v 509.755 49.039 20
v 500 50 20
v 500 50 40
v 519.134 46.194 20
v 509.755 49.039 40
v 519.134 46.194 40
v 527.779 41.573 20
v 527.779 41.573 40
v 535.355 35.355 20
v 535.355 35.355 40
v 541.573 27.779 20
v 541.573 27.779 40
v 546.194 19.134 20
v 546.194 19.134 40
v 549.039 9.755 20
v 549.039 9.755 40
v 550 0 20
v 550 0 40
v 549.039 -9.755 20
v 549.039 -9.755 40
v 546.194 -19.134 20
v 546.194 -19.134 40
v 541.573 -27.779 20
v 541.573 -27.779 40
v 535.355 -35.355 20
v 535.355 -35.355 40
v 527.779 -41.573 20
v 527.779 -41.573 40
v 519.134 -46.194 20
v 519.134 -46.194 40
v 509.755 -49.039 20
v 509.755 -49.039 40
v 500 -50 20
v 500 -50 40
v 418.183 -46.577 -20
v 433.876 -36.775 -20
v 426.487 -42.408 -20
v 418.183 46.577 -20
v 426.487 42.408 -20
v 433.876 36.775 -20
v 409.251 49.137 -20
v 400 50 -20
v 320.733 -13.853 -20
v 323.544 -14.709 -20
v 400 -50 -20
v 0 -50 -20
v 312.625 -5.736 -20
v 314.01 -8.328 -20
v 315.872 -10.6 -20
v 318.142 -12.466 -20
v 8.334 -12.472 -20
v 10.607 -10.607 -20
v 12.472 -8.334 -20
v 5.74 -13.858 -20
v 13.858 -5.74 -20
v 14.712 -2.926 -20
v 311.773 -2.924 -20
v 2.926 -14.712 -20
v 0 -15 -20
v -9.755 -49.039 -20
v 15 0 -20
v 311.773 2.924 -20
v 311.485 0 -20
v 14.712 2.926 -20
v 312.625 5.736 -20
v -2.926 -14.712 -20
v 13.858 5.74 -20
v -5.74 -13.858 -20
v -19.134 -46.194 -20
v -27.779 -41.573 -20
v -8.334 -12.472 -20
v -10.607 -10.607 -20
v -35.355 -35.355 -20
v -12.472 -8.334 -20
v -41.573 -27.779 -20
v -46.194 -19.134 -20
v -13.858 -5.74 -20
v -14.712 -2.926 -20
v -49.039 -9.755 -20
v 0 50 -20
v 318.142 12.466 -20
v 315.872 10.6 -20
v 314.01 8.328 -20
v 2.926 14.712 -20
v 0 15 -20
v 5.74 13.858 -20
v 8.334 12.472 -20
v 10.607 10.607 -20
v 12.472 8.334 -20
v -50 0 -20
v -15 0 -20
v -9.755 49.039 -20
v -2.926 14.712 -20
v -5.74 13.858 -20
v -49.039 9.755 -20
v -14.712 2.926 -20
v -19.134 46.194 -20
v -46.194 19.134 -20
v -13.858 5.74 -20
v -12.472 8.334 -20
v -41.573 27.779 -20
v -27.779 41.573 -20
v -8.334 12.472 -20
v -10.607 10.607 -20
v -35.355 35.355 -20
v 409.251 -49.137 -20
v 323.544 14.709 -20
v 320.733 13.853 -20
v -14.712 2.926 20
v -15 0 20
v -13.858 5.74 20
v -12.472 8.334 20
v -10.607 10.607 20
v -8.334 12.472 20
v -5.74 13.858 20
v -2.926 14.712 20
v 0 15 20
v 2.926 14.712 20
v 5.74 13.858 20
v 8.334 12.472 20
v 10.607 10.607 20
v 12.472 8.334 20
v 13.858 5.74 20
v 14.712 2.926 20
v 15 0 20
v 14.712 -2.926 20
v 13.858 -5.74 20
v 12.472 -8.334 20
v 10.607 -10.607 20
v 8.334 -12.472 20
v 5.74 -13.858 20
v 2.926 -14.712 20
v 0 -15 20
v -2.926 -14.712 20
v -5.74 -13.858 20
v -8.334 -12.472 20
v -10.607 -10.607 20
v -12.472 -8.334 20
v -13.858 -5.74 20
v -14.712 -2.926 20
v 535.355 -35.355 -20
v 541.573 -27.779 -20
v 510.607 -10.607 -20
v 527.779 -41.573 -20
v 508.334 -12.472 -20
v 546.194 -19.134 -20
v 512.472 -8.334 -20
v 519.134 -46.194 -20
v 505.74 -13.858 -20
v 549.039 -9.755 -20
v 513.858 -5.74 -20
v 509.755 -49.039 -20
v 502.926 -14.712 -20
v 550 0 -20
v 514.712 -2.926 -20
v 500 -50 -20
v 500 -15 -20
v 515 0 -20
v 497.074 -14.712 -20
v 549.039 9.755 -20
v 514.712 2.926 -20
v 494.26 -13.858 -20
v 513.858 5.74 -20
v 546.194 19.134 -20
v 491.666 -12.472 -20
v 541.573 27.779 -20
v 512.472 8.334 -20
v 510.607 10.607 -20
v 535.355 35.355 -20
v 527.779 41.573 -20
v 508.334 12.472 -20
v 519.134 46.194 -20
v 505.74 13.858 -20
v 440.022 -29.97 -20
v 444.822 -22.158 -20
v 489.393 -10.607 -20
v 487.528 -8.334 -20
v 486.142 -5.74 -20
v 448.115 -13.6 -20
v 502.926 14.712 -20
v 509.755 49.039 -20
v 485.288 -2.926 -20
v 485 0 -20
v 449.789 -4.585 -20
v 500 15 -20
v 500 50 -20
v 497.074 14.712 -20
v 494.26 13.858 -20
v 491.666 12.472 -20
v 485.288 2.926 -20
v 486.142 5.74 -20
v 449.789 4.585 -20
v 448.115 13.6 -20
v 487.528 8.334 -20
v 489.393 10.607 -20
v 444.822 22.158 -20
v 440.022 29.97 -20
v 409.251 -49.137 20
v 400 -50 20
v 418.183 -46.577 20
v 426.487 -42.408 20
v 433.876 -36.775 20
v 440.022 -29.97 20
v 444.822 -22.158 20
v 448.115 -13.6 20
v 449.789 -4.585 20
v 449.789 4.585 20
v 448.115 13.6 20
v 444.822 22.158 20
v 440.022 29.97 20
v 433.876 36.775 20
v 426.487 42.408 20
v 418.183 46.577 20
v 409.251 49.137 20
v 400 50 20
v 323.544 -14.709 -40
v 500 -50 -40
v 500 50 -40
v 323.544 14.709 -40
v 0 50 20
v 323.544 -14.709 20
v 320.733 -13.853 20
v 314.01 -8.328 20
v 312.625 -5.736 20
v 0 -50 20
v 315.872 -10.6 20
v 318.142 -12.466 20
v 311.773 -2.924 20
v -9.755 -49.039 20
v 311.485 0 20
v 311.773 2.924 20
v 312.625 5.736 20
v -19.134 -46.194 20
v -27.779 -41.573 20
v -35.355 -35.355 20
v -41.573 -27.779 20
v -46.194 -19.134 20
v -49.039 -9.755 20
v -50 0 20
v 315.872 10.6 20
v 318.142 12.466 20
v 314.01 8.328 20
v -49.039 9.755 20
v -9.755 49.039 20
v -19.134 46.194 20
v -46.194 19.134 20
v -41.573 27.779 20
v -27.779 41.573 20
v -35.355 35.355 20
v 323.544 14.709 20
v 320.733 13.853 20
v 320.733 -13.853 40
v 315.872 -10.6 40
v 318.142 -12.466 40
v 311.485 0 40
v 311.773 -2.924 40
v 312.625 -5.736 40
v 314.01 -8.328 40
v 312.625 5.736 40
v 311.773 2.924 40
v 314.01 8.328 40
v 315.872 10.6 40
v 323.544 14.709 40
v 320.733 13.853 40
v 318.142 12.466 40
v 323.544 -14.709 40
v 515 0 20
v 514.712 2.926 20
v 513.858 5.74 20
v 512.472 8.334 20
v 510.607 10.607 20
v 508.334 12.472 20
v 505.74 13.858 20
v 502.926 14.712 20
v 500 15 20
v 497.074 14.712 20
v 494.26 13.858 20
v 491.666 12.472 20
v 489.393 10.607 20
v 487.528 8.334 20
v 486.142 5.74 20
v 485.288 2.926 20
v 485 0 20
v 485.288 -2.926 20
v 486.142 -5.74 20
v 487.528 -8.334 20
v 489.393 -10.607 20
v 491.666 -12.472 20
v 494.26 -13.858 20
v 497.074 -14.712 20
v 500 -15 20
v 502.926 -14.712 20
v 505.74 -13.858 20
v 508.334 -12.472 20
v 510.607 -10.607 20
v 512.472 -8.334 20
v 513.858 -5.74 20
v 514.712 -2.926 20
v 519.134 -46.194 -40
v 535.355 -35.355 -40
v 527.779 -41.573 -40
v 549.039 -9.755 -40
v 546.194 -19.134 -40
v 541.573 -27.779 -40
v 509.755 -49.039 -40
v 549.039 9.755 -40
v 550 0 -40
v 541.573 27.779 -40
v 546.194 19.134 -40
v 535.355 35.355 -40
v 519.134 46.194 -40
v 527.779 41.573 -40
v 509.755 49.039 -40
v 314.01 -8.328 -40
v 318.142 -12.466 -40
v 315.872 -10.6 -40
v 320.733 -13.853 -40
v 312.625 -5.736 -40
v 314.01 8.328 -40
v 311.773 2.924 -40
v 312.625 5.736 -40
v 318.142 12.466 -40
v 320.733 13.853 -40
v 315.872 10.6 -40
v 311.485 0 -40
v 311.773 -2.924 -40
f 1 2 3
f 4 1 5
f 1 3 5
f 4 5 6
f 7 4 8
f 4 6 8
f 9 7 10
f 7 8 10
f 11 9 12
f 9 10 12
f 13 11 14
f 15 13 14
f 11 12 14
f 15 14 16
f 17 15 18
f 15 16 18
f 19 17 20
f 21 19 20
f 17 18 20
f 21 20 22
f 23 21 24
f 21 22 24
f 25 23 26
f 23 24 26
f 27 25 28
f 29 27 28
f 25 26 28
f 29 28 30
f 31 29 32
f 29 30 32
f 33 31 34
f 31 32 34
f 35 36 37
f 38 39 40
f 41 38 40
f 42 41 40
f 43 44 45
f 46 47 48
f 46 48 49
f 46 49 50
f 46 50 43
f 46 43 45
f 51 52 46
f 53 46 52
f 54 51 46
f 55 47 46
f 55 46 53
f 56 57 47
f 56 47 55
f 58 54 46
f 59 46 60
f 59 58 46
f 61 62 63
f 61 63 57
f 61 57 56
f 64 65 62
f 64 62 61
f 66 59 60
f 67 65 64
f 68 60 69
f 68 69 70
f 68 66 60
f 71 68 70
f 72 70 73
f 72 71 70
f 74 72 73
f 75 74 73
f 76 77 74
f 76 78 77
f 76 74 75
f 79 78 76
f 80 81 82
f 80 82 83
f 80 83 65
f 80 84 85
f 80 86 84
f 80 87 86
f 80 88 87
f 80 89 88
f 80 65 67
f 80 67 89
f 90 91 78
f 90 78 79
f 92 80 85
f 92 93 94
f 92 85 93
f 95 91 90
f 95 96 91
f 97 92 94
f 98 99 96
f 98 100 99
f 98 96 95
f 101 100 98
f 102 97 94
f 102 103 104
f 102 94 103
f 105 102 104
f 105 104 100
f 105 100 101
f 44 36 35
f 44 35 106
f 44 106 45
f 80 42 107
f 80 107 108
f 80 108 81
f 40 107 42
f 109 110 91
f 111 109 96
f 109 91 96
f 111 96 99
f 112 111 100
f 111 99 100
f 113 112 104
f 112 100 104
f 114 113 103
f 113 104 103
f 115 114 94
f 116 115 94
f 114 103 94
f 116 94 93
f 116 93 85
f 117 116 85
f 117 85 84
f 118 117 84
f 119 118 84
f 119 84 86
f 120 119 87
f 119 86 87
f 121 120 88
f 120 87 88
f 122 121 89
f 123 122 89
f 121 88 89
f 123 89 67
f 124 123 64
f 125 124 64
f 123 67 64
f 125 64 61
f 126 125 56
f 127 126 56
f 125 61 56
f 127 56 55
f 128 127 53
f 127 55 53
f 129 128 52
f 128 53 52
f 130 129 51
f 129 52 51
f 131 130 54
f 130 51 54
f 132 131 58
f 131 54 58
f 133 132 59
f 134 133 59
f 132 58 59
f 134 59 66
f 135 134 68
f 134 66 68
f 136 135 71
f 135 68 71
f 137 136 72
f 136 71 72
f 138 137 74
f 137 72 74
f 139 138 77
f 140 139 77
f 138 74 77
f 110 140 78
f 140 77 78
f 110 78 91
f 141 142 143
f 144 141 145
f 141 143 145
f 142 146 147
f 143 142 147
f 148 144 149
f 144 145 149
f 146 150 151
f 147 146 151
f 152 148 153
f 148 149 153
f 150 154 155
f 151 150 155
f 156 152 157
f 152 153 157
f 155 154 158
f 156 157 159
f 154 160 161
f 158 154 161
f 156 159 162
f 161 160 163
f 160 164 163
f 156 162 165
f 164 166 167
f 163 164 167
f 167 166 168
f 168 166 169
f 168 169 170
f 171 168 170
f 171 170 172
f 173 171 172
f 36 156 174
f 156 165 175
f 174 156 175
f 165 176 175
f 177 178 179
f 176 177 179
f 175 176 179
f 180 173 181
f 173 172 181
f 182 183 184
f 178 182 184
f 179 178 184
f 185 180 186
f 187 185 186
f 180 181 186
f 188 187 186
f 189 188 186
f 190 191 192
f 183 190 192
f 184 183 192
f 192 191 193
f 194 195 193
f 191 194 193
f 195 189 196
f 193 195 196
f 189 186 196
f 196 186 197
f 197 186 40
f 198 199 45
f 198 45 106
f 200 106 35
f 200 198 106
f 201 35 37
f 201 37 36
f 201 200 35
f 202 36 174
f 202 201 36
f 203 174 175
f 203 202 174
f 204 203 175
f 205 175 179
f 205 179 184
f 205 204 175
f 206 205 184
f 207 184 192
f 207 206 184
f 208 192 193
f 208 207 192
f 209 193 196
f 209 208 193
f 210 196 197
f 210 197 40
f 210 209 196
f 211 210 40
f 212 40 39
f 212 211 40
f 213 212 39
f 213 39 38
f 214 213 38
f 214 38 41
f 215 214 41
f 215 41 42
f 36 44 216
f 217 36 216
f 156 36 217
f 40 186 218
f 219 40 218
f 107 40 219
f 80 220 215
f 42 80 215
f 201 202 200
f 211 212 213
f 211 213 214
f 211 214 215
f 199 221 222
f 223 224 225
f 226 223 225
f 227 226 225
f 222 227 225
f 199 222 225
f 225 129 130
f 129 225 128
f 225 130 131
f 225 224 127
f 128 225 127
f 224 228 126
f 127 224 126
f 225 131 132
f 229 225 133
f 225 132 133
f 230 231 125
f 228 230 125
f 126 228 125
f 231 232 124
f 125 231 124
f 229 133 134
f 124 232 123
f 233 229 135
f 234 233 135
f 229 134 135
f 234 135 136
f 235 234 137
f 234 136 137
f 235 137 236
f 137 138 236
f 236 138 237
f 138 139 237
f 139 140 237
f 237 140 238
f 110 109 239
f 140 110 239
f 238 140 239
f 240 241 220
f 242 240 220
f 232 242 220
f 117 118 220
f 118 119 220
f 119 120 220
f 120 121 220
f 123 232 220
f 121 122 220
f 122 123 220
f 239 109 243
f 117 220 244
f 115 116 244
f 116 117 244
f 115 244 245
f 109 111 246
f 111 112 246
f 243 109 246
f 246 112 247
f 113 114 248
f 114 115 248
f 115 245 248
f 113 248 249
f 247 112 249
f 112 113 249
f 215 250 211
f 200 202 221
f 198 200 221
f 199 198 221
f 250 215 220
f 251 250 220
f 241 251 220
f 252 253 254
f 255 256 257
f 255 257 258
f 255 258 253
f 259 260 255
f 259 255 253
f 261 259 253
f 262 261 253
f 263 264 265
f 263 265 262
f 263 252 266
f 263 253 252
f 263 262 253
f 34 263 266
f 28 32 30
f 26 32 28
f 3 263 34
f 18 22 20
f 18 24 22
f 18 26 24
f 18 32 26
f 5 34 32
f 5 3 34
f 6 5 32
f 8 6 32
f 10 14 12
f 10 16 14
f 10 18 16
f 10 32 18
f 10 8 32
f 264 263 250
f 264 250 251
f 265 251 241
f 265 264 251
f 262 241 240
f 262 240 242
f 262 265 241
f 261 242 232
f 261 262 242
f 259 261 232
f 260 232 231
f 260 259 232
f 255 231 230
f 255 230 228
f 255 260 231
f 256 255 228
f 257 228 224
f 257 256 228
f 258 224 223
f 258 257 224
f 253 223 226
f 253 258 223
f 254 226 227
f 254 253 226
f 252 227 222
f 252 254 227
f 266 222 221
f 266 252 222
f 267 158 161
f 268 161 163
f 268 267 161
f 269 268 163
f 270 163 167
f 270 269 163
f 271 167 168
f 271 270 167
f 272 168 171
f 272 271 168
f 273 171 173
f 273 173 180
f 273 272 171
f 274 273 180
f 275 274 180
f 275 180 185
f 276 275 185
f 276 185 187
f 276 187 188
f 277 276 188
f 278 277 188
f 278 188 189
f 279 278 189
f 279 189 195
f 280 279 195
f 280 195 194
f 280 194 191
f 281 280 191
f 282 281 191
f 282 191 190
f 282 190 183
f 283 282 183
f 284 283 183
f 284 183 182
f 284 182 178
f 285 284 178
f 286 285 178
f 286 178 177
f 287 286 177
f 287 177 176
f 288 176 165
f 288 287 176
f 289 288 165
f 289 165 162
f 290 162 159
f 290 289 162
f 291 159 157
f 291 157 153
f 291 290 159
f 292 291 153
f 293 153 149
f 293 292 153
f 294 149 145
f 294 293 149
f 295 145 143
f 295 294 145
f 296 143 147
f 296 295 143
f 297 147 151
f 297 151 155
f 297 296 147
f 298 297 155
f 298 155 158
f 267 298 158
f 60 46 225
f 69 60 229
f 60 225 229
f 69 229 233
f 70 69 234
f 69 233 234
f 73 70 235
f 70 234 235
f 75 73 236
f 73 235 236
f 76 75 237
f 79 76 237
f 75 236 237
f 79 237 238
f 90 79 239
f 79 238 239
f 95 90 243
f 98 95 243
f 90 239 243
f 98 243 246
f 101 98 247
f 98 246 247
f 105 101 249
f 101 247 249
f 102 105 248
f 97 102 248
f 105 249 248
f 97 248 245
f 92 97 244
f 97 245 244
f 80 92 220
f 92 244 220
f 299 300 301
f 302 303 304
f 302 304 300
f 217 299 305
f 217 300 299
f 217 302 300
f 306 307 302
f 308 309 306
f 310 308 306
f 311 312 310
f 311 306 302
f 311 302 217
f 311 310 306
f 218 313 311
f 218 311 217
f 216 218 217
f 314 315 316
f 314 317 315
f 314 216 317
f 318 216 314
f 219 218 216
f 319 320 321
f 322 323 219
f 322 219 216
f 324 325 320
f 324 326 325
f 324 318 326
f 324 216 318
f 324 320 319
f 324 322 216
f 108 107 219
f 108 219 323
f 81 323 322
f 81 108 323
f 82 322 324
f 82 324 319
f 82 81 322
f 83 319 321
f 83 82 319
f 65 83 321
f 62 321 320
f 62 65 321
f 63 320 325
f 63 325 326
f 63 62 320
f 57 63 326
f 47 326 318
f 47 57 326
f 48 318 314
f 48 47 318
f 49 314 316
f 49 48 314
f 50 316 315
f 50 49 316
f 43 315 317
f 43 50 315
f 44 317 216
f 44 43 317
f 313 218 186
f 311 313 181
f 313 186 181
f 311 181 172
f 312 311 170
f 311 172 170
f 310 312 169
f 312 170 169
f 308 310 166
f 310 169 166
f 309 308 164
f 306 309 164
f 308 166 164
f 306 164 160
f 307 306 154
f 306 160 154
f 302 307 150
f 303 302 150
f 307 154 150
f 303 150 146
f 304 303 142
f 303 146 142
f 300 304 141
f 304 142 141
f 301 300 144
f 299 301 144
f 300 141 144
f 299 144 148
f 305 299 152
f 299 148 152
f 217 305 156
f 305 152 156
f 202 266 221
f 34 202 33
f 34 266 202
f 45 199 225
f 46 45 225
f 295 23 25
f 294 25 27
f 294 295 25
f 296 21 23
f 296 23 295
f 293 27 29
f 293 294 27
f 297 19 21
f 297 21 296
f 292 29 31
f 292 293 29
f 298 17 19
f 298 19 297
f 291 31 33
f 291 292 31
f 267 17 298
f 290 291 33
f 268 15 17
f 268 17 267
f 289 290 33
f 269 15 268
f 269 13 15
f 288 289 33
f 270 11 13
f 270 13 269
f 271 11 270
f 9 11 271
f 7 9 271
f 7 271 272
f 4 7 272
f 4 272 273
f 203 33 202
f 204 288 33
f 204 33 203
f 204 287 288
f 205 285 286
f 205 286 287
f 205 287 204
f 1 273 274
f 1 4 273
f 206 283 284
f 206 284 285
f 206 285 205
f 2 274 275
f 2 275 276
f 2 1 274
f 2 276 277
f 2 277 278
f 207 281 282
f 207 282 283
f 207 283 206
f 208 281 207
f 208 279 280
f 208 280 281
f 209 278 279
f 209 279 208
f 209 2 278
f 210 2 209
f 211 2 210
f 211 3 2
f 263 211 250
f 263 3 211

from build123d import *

# Parameters (mm, degrees)
BOSS_EXTRUDE2_DEPTH = 40
CUT_EXTRUDE6_DEPTH  = 20
SKETCH11_R          = 15
BOSS_EXTRUDE3_DEPTH = 80
CUT_EXTRUDE7_DEPTH  = 20
CUT_EXTRUDE9_START  = -20
CUT_EXTRUDE9_DEPTH  = 20
SKETCH15_R          = 15
CUT_EXTRUDE10_DEPTH = 40


with BuildPart() as part:
    # Sketch4 → Boss-Extrude2 (new, symmetric)
    with BuildSketch(Plane.XY):
        with BuildLine():
            Line((-250, 50), (250, 50))
            ThreePointArc((250, 50), (300, 0), (250, -50))
            Line((250, -50), (-250, -50))
            ThreePointArc((-250, -50), (-300, 0), (-250, 50))
        make_face()
    extrude(amount=BOSS_EXTRUDE2_DEPTH, both=True)

    # Sketch10 → Cut-Extrude6 (cut, symmetric)
    with BuildSketch(Plane.XY):
        with BuildLine():
            Line((150, 50), (250, 50))
            ThreePointArc((250, 50), (300, 0), (250, -50))
            Line((250, -50), (150, -50))
            ThreePointArc((150, -50), (200, 0), (150, 50))
        make_face()
    extrude(amount=CUT_EXTRUDE6_DEPTH, both=True, mode=Mode.SUBTRACT)

    # Sketch11 → Boss-Extrude3 (add)
    with BuildSketch(Plane.XY.offset(40)):
        with Locations((250, 0)):
            Circle(SKETCH11_R)
    extrude(amount=-BOSS_EXTRUDE3_DEPTH)

    # Sketch12 → Cut-Extrude7 (cut)
    with BuildSketch(Plane.XY.offset(40)):
        with BuildLine():
            Line((250, 50), (73.543550677, 14.708710135))
            ThreePointArc((73.543550677, 14.708710135), (61.485292704, 0), (73.543550677, -14.708710135))
            Line((73.543550677, -14.708710135), (250, -50))
            Line((250, -50), (-250, -50))
            ThreePointArc((-250, -50), (-300, 0), (-250, 50))
            Line((-250, 50), (250, 50))
        make_face()
    extrude(amount=-CUT_EXTRUDE7_DEPTH, mode=Mode.SUBTRACT)

    # Sketch14 → Cut-Extrude9 (cut)
    with BuildSketch(Plane(origin=(0, 0, -40), x_dir=(-1, 0, 0), z_dir=(0, 0, -1)).offset(CUT_EXTRUDE9_START)):
        with BuildLine():
            Line((-73.543550677, -14.708710135), (-250, -50))
            Line((-250, -50), (250, -50))
            ThreePointArc((250, -50), (300, 0), (250, 50))
            Line((250, 50), (-250, 50))
            Line((-250, 50), (-73.543550677, 14.708710135))
            ThreePointArc((-73.543550677, 14.708710135), (-61.485292704, 0), (-73.543550677, -14.708710135))
        make_face()
    extrude(amount=CUT_EXTRUDE9_DEPTH, mode=Mode.SUBTRACT)

    # Sketch15 → Cut-Extrude10 (cut)
    with BuildSketch(Plane(origin=(0, 0, -20), x_dir=(-1, 0, 0), z_dir=(0, 0, -1))):
        with Locations((250, 0)):
            Circle(SKETCH15_R)
    extrude(amount=-CUT_EXTRUDE10_DEPTH, mode=Mode.SUBTRACT)


with BuildPart() as part_1:
    # Body-Move/Copy1: moved
    add(part.part.moved(Location((250, 0, 0))))


solid = part_1.part
